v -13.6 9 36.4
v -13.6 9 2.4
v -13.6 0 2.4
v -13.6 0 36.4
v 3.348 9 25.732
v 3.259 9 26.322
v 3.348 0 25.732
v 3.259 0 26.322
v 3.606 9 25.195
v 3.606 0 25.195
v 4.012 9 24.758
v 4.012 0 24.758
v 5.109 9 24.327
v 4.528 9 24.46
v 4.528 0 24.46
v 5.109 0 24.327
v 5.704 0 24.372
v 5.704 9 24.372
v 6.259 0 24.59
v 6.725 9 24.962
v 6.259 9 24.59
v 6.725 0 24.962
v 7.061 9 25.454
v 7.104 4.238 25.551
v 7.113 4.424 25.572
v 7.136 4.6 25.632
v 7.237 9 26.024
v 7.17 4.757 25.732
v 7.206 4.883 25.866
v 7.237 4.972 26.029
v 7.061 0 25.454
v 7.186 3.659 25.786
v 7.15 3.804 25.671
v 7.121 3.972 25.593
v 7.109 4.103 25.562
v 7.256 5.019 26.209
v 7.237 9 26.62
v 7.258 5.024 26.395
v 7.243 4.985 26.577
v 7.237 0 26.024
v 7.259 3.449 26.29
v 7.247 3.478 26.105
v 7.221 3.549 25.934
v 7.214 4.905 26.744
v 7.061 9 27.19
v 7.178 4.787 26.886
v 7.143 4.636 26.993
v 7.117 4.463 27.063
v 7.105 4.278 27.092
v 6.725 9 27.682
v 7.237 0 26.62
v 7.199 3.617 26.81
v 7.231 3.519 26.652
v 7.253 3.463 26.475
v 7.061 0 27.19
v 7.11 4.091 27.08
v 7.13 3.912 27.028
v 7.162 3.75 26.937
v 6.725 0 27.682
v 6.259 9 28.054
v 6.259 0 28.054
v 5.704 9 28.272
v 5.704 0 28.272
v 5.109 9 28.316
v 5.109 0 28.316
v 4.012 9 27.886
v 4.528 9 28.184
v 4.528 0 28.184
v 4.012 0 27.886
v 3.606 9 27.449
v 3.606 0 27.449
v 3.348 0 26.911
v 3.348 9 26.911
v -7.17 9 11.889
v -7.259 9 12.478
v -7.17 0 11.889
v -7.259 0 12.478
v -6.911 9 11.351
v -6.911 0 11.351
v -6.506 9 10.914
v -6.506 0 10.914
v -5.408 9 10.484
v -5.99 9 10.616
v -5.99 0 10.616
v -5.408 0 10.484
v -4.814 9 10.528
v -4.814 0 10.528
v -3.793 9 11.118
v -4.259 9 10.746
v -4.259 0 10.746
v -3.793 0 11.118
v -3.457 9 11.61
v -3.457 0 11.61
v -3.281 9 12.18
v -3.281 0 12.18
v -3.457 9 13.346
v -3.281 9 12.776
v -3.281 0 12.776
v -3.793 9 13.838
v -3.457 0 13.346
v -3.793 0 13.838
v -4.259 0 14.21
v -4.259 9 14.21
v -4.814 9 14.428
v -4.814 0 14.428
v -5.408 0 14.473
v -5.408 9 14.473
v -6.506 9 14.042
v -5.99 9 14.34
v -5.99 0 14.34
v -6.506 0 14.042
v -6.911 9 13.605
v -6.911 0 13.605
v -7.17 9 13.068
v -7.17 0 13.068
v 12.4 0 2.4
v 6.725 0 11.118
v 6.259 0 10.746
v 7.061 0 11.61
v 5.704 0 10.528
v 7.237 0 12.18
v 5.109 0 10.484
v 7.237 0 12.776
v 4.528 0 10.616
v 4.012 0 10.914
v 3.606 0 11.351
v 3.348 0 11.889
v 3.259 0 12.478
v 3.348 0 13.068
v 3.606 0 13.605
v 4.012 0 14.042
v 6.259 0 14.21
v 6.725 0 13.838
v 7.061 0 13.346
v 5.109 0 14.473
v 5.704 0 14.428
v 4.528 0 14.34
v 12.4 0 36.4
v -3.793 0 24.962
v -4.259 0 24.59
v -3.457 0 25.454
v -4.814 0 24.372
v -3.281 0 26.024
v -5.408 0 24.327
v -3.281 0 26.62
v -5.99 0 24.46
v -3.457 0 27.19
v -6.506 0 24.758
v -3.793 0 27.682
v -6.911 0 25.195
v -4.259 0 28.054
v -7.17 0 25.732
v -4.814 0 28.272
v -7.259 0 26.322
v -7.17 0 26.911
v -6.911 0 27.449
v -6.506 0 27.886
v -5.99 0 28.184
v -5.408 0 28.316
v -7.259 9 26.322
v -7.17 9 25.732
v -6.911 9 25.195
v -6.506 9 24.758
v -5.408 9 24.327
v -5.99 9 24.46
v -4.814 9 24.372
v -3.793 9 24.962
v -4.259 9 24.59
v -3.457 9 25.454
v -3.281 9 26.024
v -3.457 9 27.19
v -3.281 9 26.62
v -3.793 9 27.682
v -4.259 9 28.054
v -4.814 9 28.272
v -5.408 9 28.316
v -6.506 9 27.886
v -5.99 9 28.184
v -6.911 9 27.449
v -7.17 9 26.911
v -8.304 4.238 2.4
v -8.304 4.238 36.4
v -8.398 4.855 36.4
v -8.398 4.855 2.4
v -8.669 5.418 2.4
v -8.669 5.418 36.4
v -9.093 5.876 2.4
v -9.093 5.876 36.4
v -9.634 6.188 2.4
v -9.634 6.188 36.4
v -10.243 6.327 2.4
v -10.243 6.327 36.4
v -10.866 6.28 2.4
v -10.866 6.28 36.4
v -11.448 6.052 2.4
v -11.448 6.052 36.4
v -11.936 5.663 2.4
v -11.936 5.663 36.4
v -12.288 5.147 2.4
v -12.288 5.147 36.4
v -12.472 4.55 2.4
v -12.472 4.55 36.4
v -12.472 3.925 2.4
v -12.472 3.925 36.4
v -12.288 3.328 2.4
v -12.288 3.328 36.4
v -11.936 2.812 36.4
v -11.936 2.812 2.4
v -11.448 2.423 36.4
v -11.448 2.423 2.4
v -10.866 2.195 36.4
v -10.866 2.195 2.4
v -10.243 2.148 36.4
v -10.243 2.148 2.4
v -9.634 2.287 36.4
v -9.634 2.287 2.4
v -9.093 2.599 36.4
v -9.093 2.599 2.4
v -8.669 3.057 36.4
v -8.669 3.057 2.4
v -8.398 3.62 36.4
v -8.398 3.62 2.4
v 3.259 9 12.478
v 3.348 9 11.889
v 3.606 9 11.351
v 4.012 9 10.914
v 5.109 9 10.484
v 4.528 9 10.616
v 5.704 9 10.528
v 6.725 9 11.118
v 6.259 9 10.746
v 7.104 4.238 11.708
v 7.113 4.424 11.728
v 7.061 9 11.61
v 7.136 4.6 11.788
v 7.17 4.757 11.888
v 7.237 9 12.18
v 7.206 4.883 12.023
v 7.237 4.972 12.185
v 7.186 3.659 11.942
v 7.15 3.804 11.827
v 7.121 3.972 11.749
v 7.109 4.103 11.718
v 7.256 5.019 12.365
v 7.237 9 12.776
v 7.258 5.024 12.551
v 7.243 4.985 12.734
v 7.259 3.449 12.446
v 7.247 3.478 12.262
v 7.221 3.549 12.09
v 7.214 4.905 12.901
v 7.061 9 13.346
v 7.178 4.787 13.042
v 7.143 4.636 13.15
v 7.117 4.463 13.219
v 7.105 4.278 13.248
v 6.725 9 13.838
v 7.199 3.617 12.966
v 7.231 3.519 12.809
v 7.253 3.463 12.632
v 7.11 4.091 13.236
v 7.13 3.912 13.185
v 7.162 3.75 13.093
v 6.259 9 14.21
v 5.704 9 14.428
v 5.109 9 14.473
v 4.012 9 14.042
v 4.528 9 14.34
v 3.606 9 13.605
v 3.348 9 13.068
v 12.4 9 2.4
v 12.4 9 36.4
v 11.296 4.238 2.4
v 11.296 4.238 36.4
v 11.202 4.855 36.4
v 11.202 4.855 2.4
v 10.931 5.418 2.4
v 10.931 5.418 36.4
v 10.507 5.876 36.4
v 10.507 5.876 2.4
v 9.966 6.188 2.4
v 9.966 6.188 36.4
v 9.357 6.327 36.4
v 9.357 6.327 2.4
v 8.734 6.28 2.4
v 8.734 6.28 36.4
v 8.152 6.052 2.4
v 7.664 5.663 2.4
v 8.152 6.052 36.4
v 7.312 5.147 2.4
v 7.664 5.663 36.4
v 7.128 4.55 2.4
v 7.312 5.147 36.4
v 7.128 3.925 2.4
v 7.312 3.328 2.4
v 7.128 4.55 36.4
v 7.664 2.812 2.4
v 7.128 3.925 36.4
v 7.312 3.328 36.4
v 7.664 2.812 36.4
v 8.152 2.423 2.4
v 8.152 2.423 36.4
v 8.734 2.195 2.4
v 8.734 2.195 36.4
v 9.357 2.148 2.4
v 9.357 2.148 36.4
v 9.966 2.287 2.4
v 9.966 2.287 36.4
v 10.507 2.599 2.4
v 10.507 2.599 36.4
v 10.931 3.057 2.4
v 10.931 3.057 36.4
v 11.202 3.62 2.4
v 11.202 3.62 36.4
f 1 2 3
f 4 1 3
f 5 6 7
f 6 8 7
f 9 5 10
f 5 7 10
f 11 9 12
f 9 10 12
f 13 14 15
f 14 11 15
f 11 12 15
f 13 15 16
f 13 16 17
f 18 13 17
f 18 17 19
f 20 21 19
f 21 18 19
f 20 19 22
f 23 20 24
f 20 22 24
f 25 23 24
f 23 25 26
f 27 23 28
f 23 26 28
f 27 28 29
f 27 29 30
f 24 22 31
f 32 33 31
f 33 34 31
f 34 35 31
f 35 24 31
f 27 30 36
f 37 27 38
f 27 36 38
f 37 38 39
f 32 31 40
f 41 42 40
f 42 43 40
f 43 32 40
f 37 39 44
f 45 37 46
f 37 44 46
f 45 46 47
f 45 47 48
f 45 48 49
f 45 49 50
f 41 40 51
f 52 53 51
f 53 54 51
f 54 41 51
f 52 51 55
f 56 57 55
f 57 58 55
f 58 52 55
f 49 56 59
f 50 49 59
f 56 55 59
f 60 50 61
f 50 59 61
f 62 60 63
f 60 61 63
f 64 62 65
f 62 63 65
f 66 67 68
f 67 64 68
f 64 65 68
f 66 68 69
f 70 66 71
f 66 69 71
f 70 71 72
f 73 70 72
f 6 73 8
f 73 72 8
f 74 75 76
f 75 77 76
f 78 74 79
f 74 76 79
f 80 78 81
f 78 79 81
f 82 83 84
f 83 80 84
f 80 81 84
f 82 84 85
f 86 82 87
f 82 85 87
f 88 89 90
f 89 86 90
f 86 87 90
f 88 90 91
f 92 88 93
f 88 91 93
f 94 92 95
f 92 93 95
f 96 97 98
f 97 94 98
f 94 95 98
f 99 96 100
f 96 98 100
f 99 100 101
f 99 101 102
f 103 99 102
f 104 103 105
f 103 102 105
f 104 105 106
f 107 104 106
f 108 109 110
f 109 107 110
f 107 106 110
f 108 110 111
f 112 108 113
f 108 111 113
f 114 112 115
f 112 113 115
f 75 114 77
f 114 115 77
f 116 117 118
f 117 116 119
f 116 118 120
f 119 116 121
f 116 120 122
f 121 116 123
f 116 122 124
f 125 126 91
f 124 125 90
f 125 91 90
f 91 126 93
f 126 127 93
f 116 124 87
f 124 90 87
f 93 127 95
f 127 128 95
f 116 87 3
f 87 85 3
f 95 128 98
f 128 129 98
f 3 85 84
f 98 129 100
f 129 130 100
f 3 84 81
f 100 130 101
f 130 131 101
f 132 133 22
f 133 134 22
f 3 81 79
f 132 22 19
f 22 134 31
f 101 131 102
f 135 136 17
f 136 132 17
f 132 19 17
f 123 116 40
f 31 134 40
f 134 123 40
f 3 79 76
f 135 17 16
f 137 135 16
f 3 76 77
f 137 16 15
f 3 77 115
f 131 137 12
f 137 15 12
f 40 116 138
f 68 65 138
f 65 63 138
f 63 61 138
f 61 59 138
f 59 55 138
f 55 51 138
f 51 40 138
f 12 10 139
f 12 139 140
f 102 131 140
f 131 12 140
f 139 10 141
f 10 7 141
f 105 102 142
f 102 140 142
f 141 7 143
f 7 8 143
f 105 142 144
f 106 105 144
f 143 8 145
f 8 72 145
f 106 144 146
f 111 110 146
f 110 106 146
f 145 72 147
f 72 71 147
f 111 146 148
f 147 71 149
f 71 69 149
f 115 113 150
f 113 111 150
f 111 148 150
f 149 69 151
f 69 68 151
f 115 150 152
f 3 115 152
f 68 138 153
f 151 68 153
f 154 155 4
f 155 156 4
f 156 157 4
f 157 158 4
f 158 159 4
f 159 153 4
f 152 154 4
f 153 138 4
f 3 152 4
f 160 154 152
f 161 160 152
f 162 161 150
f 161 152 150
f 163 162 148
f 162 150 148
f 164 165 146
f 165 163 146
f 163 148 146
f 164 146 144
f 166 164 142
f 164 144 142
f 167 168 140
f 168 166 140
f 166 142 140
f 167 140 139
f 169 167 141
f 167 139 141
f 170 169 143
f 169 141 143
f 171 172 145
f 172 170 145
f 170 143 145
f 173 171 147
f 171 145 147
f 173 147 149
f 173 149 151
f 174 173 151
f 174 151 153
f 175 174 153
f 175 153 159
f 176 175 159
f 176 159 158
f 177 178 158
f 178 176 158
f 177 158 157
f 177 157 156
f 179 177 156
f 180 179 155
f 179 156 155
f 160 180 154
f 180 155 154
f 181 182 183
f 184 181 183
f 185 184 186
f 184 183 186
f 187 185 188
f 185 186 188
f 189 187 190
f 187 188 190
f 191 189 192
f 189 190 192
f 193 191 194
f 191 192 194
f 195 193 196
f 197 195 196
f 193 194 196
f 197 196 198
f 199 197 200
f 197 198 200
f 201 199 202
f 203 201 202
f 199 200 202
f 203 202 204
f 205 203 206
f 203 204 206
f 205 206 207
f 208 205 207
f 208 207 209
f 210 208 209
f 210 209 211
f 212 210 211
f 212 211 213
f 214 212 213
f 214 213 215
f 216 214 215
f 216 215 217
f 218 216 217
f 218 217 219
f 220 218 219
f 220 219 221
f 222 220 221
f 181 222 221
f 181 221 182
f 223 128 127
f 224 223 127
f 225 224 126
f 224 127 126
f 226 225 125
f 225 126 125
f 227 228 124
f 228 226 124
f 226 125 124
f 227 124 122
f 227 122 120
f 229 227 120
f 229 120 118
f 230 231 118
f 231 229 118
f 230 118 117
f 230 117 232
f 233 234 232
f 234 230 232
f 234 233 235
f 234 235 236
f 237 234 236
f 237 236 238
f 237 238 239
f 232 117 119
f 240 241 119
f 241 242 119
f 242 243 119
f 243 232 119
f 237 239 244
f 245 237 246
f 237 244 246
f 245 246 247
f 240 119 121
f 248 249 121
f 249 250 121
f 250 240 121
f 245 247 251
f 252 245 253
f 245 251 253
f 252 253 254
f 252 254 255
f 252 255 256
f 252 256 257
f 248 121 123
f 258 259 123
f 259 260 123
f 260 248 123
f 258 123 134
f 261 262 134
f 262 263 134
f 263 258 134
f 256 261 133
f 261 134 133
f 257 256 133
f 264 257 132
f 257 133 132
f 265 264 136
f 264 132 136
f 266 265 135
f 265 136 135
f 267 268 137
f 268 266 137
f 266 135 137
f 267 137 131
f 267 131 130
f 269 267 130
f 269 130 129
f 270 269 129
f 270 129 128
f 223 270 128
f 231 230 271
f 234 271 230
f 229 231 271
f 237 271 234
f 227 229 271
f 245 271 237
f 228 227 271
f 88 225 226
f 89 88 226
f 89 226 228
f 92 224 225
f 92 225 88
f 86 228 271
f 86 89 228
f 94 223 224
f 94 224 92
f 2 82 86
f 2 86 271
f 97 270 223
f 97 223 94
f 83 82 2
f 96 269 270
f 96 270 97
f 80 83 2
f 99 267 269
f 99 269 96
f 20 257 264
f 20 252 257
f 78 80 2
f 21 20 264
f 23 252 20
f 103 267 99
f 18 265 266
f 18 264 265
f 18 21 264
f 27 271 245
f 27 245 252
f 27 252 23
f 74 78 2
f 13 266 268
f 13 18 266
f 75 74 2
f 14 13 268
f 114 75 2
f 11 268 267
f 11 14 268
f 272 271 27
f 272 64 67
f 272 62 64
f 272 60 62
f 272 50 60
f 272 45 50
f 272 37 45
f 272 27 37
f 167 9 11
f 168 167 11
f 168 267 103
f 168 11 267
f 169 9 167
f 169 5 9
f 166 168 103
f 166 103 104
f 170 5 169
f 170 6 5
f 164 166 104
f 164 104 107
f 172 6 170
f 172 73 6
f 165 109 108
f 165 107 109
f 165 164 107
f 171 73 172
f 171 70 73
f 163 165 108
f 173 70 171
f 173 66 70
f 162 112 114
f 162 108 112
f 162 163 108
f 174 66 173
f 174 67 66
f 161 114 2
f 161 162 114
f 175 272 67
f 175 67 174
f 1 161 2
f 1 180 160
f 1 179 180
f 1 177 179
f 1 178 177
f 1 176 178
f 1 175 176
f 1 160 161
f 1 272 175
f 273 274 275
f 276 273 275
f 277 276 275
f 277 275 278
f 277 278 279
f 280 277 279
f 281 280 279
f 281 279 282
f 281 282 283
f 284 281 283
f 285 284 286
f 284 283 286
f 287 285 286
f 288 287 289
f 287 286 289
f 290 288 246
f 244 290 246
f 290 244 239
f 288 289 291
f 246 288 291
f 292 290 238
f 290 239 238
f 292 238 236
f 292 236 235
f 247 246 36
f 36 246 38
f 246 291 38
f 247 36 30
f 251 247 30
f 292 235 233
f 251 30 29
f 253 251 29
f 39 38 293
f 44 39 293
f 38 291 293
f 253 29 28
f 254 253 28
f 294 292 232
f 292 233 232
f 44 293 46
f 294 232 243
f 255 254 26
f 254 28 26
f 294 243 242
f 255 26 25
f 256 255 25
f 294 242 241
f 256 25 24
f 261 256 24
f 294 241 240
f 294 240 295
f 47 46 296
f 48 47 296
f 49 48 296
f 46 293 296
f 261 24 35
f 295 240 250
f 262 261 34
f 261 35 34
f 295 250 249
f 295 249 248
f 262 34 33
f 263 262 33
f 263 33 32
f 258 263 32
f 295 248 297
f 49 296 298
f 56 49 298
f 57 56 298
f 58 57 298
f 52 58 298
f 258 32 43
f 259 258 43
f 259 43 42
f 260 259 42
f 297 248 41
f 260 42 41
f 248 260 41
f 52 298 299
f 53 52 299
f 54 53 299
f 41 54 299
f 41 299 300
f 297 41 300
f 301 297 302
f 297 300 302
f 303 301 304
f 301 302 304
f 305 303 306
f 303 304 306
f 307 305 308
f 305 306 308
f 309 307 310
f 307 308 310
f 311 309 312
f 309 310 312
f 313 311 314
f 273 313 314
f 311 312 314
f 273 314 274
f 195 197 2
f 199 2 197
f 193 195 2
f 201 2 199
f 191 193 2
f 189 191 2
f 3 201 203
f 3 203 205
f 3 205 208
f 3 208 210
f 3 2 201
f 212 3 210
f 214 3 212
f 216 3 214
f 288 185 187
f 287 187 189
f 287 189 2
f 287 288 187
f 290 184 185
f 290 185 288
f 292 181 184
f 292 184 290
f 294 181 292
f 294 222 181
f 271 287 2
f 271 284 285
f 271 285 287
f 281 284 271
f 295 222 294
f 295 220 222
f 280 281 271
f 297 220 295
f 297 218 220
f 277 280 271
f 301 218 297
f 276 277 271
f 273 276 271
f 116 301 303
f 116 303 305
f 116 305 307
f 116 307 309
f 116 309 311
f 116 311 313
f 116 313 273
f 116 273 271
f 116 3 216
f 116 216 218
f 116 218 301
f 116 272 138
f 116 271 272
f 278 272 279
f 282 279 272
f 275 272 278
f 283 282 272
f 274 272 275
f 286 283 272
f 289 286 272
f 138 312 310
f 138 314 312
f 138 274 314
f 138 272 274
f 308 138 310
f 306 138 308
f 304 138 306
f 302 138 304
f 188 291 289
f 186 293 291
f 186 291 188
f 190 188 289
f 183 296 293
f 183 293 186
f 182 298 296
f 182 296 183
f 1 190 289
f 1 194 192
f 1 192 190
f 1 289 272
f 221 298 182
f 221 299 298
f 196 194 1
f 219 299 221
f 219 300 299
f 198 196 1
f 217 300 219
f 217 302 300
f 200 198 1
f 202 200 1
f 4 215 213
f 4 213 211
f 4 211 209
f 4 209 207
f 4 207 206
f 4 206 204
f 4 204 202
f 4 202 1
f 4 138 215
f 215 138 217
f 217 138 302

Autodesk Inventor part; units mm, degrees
ref_plane "YZ Plane" through (0, 0, 0) normal (1, 0, 0) x (0, 1, 0)
ref_plane "XZ Plane" through (0, 0, 0) normal (0, 1, 0) x (-1, 0, 0)
ref_plane "XY Plane" through (0, 0, 0) normal (0, 0, 1) x (1, 0, 0)
sketch "Sketch1" plane through (0, 0, 0) normal (0, 1, 0) x (-1, 0, 0)
  line L0 (-16.4, 36.4) -> (17.6, 36.4)
  line L1 (17.6, 2.4) -> (-16.4, 2.4)
  line L2 (0, 36.4) -> (10, 36.4)
  line L3 (16.4, 6.0801) -> (17.6, 6.0801)
  line L4 (10, 24.9) -> (12.1364, 24.9)
  line L5 (-16.4, 2.4) -> (-16.4, 6.0801)
  line L6 (-16.4, 43.7199) -> (-16.4, 36.4)
  line L7 (17.6, 36.4) -> (17.6, 43.7199)
  line L8 (17.6, 6.0801) -> (17.6, 2.4)
  line L9 (0, 36.4) -> (0, 32.7199)
  line L10 (-16.4, 36.4) -> (17.6, 36.4)
  line L11 (17.6, 36.4) -> (17.6, 2.4)
  line L12 (17.6, 2.4) -> (-16.4, 2.4)
  line L13 (-16.4, 2.4) -> (-16.4, 36.4)
  circle A0 centre (-5.2589, 26.3219) radius 2
  line L14 (0, 19.4) -> (0, 2.4)
  circle A1 centre (5.2589, 26.3219) radius 2
  circle A2 centre (-5.2589, 12.4781) radius 2
  circle A3 centre (5.2589, 12.4781) radius 2
  point P0 (0, 0)
  point P1 (10, 2.4)
  point P2 (-10, 47.4)
  point P3 (-10, 2.4)
  point P4 (-17.6, 6.0801)
  point P5 (-17.6, 43.7199)
  point P6 (-10, 24.9)
  dimension "d1" = 34
  dimension "d4" = 10
  dimension "d5" = 4
extrude "Extrusion2" add sketch "Sketch1" along normal blind 9
sketch "Sketch7" plane through (-17.6, 0, 36.4) normal (0, 0, 1) x (1, 0, 0)
  line L0 (0, 0) -> (34, 0) projected
  line L1 (0, 9) -> (34, 9) projected
  line L2 (17, 9) -> (17, 0)
  line L3 (0, 9) -> (17, 9)
  circle A0 centre (30.6525, 4.2375) radius 2.0955
  circle A1 centre (7.2, 4.2375) radius 2.0955
  line L4 (18.8525, 9) -> (-33.0985, 9)
  line L5 (18.8525, 23.1318) -> (18.8525, -15.955)
  line L6 (0, 0) -> (0, 9) projected
  dimension "d16" = 4.7625
  dimension "d21" = 7.2
extrude "Extrusion6" cut sketch "Sketch7" against normal up to next contours A1
sketch "Sketch8" plane through (-17.6, 0, 36.4) normal (0, 0, 1) x (1, 0, 0)
  circle A0 centre (7.2, 4.2375) radius 2.0955 projected
  line L0 (0, 9) -> (34, 9) projected
  line L1 (0, 0) -> (0, 9) projected
  line L2 (17, 9) -> (17, 4.5)
  circle A1 centre (7.2, 4.2375) radius 2.0955
  circle A2 centre (26.8, 4.2375) radius 2.0955
  line L3 (34, 0) -> (34, 9) projected
  point P0 (17.6, 0)
  dimension "d22" = 7.2
  dimension "d23" = 7.2
  dimension "d24" = 19.6
extrude "Extrusion7" cut sketch "Sketch8" against normal up to next contours A2
sketch "Sketch10" plane through (16.4, 0, 2.4) normal (0, 0, -1) x (-1, 0, 0)
  line L0 (0, 0) -> (34, 0) projected
  line L1 (0, 9) -> (4, 9)
  line L2 (4, 9) -> (4, 0)
  line L3 (4, 0) -> (0, 0)
  line L4 (0, 0) -> (0, 9)
  point P0 (16.4, 0)
  dimension "d25" = 4
extrude "Extrusion8" cut sketch "Sketch10" against normal through all
sketch "Sketch11" plane through (-17.6, 0, 2.4) normal (0, 0, -1) x (-1, 0, 0)
  line L0 (-30, 0) -> (0, 0) projected
  line L1 (0, 9) -> (-4, 9)
  line L2 (-4, 9) -> (-4, 0)
  line L3 (-4, 0) -> (0, 0)
  line L4 (0, 0) -> (0, 9)
  point P0 (-17.6, 0)
  dimension "d28" = 4
extrude "Extrusion9" cut sketch "Sketch11" against normal through all
sketch "Sketch14" plane through (12.4, 0, 36.4) normal (1, 0, 0) x (0, 0, -1)
  line L0 (0, 0) -> (0, 9) projected
  line L1 (8.0781, 9) -> (8.0781, 15) projected
  line L2 (0, 15) -> (8.0781, 15) projected
  line L3 (0, 0) -> (0, 6.35)
  line L4 (0, 6.35) -> (10.8068, 6.35)
  line L5 (4.039, 15) -> (4.039, 6.35)
  circle A0 centre (4.039, 10.389) radius 4.039
  circle A1 centre (4.039, 10.389) radius 3.175
  point P0 (36.4, 0)
  dimension "d35" = 6.35
  dimension "d36" = 6.35
properties part number "top"
